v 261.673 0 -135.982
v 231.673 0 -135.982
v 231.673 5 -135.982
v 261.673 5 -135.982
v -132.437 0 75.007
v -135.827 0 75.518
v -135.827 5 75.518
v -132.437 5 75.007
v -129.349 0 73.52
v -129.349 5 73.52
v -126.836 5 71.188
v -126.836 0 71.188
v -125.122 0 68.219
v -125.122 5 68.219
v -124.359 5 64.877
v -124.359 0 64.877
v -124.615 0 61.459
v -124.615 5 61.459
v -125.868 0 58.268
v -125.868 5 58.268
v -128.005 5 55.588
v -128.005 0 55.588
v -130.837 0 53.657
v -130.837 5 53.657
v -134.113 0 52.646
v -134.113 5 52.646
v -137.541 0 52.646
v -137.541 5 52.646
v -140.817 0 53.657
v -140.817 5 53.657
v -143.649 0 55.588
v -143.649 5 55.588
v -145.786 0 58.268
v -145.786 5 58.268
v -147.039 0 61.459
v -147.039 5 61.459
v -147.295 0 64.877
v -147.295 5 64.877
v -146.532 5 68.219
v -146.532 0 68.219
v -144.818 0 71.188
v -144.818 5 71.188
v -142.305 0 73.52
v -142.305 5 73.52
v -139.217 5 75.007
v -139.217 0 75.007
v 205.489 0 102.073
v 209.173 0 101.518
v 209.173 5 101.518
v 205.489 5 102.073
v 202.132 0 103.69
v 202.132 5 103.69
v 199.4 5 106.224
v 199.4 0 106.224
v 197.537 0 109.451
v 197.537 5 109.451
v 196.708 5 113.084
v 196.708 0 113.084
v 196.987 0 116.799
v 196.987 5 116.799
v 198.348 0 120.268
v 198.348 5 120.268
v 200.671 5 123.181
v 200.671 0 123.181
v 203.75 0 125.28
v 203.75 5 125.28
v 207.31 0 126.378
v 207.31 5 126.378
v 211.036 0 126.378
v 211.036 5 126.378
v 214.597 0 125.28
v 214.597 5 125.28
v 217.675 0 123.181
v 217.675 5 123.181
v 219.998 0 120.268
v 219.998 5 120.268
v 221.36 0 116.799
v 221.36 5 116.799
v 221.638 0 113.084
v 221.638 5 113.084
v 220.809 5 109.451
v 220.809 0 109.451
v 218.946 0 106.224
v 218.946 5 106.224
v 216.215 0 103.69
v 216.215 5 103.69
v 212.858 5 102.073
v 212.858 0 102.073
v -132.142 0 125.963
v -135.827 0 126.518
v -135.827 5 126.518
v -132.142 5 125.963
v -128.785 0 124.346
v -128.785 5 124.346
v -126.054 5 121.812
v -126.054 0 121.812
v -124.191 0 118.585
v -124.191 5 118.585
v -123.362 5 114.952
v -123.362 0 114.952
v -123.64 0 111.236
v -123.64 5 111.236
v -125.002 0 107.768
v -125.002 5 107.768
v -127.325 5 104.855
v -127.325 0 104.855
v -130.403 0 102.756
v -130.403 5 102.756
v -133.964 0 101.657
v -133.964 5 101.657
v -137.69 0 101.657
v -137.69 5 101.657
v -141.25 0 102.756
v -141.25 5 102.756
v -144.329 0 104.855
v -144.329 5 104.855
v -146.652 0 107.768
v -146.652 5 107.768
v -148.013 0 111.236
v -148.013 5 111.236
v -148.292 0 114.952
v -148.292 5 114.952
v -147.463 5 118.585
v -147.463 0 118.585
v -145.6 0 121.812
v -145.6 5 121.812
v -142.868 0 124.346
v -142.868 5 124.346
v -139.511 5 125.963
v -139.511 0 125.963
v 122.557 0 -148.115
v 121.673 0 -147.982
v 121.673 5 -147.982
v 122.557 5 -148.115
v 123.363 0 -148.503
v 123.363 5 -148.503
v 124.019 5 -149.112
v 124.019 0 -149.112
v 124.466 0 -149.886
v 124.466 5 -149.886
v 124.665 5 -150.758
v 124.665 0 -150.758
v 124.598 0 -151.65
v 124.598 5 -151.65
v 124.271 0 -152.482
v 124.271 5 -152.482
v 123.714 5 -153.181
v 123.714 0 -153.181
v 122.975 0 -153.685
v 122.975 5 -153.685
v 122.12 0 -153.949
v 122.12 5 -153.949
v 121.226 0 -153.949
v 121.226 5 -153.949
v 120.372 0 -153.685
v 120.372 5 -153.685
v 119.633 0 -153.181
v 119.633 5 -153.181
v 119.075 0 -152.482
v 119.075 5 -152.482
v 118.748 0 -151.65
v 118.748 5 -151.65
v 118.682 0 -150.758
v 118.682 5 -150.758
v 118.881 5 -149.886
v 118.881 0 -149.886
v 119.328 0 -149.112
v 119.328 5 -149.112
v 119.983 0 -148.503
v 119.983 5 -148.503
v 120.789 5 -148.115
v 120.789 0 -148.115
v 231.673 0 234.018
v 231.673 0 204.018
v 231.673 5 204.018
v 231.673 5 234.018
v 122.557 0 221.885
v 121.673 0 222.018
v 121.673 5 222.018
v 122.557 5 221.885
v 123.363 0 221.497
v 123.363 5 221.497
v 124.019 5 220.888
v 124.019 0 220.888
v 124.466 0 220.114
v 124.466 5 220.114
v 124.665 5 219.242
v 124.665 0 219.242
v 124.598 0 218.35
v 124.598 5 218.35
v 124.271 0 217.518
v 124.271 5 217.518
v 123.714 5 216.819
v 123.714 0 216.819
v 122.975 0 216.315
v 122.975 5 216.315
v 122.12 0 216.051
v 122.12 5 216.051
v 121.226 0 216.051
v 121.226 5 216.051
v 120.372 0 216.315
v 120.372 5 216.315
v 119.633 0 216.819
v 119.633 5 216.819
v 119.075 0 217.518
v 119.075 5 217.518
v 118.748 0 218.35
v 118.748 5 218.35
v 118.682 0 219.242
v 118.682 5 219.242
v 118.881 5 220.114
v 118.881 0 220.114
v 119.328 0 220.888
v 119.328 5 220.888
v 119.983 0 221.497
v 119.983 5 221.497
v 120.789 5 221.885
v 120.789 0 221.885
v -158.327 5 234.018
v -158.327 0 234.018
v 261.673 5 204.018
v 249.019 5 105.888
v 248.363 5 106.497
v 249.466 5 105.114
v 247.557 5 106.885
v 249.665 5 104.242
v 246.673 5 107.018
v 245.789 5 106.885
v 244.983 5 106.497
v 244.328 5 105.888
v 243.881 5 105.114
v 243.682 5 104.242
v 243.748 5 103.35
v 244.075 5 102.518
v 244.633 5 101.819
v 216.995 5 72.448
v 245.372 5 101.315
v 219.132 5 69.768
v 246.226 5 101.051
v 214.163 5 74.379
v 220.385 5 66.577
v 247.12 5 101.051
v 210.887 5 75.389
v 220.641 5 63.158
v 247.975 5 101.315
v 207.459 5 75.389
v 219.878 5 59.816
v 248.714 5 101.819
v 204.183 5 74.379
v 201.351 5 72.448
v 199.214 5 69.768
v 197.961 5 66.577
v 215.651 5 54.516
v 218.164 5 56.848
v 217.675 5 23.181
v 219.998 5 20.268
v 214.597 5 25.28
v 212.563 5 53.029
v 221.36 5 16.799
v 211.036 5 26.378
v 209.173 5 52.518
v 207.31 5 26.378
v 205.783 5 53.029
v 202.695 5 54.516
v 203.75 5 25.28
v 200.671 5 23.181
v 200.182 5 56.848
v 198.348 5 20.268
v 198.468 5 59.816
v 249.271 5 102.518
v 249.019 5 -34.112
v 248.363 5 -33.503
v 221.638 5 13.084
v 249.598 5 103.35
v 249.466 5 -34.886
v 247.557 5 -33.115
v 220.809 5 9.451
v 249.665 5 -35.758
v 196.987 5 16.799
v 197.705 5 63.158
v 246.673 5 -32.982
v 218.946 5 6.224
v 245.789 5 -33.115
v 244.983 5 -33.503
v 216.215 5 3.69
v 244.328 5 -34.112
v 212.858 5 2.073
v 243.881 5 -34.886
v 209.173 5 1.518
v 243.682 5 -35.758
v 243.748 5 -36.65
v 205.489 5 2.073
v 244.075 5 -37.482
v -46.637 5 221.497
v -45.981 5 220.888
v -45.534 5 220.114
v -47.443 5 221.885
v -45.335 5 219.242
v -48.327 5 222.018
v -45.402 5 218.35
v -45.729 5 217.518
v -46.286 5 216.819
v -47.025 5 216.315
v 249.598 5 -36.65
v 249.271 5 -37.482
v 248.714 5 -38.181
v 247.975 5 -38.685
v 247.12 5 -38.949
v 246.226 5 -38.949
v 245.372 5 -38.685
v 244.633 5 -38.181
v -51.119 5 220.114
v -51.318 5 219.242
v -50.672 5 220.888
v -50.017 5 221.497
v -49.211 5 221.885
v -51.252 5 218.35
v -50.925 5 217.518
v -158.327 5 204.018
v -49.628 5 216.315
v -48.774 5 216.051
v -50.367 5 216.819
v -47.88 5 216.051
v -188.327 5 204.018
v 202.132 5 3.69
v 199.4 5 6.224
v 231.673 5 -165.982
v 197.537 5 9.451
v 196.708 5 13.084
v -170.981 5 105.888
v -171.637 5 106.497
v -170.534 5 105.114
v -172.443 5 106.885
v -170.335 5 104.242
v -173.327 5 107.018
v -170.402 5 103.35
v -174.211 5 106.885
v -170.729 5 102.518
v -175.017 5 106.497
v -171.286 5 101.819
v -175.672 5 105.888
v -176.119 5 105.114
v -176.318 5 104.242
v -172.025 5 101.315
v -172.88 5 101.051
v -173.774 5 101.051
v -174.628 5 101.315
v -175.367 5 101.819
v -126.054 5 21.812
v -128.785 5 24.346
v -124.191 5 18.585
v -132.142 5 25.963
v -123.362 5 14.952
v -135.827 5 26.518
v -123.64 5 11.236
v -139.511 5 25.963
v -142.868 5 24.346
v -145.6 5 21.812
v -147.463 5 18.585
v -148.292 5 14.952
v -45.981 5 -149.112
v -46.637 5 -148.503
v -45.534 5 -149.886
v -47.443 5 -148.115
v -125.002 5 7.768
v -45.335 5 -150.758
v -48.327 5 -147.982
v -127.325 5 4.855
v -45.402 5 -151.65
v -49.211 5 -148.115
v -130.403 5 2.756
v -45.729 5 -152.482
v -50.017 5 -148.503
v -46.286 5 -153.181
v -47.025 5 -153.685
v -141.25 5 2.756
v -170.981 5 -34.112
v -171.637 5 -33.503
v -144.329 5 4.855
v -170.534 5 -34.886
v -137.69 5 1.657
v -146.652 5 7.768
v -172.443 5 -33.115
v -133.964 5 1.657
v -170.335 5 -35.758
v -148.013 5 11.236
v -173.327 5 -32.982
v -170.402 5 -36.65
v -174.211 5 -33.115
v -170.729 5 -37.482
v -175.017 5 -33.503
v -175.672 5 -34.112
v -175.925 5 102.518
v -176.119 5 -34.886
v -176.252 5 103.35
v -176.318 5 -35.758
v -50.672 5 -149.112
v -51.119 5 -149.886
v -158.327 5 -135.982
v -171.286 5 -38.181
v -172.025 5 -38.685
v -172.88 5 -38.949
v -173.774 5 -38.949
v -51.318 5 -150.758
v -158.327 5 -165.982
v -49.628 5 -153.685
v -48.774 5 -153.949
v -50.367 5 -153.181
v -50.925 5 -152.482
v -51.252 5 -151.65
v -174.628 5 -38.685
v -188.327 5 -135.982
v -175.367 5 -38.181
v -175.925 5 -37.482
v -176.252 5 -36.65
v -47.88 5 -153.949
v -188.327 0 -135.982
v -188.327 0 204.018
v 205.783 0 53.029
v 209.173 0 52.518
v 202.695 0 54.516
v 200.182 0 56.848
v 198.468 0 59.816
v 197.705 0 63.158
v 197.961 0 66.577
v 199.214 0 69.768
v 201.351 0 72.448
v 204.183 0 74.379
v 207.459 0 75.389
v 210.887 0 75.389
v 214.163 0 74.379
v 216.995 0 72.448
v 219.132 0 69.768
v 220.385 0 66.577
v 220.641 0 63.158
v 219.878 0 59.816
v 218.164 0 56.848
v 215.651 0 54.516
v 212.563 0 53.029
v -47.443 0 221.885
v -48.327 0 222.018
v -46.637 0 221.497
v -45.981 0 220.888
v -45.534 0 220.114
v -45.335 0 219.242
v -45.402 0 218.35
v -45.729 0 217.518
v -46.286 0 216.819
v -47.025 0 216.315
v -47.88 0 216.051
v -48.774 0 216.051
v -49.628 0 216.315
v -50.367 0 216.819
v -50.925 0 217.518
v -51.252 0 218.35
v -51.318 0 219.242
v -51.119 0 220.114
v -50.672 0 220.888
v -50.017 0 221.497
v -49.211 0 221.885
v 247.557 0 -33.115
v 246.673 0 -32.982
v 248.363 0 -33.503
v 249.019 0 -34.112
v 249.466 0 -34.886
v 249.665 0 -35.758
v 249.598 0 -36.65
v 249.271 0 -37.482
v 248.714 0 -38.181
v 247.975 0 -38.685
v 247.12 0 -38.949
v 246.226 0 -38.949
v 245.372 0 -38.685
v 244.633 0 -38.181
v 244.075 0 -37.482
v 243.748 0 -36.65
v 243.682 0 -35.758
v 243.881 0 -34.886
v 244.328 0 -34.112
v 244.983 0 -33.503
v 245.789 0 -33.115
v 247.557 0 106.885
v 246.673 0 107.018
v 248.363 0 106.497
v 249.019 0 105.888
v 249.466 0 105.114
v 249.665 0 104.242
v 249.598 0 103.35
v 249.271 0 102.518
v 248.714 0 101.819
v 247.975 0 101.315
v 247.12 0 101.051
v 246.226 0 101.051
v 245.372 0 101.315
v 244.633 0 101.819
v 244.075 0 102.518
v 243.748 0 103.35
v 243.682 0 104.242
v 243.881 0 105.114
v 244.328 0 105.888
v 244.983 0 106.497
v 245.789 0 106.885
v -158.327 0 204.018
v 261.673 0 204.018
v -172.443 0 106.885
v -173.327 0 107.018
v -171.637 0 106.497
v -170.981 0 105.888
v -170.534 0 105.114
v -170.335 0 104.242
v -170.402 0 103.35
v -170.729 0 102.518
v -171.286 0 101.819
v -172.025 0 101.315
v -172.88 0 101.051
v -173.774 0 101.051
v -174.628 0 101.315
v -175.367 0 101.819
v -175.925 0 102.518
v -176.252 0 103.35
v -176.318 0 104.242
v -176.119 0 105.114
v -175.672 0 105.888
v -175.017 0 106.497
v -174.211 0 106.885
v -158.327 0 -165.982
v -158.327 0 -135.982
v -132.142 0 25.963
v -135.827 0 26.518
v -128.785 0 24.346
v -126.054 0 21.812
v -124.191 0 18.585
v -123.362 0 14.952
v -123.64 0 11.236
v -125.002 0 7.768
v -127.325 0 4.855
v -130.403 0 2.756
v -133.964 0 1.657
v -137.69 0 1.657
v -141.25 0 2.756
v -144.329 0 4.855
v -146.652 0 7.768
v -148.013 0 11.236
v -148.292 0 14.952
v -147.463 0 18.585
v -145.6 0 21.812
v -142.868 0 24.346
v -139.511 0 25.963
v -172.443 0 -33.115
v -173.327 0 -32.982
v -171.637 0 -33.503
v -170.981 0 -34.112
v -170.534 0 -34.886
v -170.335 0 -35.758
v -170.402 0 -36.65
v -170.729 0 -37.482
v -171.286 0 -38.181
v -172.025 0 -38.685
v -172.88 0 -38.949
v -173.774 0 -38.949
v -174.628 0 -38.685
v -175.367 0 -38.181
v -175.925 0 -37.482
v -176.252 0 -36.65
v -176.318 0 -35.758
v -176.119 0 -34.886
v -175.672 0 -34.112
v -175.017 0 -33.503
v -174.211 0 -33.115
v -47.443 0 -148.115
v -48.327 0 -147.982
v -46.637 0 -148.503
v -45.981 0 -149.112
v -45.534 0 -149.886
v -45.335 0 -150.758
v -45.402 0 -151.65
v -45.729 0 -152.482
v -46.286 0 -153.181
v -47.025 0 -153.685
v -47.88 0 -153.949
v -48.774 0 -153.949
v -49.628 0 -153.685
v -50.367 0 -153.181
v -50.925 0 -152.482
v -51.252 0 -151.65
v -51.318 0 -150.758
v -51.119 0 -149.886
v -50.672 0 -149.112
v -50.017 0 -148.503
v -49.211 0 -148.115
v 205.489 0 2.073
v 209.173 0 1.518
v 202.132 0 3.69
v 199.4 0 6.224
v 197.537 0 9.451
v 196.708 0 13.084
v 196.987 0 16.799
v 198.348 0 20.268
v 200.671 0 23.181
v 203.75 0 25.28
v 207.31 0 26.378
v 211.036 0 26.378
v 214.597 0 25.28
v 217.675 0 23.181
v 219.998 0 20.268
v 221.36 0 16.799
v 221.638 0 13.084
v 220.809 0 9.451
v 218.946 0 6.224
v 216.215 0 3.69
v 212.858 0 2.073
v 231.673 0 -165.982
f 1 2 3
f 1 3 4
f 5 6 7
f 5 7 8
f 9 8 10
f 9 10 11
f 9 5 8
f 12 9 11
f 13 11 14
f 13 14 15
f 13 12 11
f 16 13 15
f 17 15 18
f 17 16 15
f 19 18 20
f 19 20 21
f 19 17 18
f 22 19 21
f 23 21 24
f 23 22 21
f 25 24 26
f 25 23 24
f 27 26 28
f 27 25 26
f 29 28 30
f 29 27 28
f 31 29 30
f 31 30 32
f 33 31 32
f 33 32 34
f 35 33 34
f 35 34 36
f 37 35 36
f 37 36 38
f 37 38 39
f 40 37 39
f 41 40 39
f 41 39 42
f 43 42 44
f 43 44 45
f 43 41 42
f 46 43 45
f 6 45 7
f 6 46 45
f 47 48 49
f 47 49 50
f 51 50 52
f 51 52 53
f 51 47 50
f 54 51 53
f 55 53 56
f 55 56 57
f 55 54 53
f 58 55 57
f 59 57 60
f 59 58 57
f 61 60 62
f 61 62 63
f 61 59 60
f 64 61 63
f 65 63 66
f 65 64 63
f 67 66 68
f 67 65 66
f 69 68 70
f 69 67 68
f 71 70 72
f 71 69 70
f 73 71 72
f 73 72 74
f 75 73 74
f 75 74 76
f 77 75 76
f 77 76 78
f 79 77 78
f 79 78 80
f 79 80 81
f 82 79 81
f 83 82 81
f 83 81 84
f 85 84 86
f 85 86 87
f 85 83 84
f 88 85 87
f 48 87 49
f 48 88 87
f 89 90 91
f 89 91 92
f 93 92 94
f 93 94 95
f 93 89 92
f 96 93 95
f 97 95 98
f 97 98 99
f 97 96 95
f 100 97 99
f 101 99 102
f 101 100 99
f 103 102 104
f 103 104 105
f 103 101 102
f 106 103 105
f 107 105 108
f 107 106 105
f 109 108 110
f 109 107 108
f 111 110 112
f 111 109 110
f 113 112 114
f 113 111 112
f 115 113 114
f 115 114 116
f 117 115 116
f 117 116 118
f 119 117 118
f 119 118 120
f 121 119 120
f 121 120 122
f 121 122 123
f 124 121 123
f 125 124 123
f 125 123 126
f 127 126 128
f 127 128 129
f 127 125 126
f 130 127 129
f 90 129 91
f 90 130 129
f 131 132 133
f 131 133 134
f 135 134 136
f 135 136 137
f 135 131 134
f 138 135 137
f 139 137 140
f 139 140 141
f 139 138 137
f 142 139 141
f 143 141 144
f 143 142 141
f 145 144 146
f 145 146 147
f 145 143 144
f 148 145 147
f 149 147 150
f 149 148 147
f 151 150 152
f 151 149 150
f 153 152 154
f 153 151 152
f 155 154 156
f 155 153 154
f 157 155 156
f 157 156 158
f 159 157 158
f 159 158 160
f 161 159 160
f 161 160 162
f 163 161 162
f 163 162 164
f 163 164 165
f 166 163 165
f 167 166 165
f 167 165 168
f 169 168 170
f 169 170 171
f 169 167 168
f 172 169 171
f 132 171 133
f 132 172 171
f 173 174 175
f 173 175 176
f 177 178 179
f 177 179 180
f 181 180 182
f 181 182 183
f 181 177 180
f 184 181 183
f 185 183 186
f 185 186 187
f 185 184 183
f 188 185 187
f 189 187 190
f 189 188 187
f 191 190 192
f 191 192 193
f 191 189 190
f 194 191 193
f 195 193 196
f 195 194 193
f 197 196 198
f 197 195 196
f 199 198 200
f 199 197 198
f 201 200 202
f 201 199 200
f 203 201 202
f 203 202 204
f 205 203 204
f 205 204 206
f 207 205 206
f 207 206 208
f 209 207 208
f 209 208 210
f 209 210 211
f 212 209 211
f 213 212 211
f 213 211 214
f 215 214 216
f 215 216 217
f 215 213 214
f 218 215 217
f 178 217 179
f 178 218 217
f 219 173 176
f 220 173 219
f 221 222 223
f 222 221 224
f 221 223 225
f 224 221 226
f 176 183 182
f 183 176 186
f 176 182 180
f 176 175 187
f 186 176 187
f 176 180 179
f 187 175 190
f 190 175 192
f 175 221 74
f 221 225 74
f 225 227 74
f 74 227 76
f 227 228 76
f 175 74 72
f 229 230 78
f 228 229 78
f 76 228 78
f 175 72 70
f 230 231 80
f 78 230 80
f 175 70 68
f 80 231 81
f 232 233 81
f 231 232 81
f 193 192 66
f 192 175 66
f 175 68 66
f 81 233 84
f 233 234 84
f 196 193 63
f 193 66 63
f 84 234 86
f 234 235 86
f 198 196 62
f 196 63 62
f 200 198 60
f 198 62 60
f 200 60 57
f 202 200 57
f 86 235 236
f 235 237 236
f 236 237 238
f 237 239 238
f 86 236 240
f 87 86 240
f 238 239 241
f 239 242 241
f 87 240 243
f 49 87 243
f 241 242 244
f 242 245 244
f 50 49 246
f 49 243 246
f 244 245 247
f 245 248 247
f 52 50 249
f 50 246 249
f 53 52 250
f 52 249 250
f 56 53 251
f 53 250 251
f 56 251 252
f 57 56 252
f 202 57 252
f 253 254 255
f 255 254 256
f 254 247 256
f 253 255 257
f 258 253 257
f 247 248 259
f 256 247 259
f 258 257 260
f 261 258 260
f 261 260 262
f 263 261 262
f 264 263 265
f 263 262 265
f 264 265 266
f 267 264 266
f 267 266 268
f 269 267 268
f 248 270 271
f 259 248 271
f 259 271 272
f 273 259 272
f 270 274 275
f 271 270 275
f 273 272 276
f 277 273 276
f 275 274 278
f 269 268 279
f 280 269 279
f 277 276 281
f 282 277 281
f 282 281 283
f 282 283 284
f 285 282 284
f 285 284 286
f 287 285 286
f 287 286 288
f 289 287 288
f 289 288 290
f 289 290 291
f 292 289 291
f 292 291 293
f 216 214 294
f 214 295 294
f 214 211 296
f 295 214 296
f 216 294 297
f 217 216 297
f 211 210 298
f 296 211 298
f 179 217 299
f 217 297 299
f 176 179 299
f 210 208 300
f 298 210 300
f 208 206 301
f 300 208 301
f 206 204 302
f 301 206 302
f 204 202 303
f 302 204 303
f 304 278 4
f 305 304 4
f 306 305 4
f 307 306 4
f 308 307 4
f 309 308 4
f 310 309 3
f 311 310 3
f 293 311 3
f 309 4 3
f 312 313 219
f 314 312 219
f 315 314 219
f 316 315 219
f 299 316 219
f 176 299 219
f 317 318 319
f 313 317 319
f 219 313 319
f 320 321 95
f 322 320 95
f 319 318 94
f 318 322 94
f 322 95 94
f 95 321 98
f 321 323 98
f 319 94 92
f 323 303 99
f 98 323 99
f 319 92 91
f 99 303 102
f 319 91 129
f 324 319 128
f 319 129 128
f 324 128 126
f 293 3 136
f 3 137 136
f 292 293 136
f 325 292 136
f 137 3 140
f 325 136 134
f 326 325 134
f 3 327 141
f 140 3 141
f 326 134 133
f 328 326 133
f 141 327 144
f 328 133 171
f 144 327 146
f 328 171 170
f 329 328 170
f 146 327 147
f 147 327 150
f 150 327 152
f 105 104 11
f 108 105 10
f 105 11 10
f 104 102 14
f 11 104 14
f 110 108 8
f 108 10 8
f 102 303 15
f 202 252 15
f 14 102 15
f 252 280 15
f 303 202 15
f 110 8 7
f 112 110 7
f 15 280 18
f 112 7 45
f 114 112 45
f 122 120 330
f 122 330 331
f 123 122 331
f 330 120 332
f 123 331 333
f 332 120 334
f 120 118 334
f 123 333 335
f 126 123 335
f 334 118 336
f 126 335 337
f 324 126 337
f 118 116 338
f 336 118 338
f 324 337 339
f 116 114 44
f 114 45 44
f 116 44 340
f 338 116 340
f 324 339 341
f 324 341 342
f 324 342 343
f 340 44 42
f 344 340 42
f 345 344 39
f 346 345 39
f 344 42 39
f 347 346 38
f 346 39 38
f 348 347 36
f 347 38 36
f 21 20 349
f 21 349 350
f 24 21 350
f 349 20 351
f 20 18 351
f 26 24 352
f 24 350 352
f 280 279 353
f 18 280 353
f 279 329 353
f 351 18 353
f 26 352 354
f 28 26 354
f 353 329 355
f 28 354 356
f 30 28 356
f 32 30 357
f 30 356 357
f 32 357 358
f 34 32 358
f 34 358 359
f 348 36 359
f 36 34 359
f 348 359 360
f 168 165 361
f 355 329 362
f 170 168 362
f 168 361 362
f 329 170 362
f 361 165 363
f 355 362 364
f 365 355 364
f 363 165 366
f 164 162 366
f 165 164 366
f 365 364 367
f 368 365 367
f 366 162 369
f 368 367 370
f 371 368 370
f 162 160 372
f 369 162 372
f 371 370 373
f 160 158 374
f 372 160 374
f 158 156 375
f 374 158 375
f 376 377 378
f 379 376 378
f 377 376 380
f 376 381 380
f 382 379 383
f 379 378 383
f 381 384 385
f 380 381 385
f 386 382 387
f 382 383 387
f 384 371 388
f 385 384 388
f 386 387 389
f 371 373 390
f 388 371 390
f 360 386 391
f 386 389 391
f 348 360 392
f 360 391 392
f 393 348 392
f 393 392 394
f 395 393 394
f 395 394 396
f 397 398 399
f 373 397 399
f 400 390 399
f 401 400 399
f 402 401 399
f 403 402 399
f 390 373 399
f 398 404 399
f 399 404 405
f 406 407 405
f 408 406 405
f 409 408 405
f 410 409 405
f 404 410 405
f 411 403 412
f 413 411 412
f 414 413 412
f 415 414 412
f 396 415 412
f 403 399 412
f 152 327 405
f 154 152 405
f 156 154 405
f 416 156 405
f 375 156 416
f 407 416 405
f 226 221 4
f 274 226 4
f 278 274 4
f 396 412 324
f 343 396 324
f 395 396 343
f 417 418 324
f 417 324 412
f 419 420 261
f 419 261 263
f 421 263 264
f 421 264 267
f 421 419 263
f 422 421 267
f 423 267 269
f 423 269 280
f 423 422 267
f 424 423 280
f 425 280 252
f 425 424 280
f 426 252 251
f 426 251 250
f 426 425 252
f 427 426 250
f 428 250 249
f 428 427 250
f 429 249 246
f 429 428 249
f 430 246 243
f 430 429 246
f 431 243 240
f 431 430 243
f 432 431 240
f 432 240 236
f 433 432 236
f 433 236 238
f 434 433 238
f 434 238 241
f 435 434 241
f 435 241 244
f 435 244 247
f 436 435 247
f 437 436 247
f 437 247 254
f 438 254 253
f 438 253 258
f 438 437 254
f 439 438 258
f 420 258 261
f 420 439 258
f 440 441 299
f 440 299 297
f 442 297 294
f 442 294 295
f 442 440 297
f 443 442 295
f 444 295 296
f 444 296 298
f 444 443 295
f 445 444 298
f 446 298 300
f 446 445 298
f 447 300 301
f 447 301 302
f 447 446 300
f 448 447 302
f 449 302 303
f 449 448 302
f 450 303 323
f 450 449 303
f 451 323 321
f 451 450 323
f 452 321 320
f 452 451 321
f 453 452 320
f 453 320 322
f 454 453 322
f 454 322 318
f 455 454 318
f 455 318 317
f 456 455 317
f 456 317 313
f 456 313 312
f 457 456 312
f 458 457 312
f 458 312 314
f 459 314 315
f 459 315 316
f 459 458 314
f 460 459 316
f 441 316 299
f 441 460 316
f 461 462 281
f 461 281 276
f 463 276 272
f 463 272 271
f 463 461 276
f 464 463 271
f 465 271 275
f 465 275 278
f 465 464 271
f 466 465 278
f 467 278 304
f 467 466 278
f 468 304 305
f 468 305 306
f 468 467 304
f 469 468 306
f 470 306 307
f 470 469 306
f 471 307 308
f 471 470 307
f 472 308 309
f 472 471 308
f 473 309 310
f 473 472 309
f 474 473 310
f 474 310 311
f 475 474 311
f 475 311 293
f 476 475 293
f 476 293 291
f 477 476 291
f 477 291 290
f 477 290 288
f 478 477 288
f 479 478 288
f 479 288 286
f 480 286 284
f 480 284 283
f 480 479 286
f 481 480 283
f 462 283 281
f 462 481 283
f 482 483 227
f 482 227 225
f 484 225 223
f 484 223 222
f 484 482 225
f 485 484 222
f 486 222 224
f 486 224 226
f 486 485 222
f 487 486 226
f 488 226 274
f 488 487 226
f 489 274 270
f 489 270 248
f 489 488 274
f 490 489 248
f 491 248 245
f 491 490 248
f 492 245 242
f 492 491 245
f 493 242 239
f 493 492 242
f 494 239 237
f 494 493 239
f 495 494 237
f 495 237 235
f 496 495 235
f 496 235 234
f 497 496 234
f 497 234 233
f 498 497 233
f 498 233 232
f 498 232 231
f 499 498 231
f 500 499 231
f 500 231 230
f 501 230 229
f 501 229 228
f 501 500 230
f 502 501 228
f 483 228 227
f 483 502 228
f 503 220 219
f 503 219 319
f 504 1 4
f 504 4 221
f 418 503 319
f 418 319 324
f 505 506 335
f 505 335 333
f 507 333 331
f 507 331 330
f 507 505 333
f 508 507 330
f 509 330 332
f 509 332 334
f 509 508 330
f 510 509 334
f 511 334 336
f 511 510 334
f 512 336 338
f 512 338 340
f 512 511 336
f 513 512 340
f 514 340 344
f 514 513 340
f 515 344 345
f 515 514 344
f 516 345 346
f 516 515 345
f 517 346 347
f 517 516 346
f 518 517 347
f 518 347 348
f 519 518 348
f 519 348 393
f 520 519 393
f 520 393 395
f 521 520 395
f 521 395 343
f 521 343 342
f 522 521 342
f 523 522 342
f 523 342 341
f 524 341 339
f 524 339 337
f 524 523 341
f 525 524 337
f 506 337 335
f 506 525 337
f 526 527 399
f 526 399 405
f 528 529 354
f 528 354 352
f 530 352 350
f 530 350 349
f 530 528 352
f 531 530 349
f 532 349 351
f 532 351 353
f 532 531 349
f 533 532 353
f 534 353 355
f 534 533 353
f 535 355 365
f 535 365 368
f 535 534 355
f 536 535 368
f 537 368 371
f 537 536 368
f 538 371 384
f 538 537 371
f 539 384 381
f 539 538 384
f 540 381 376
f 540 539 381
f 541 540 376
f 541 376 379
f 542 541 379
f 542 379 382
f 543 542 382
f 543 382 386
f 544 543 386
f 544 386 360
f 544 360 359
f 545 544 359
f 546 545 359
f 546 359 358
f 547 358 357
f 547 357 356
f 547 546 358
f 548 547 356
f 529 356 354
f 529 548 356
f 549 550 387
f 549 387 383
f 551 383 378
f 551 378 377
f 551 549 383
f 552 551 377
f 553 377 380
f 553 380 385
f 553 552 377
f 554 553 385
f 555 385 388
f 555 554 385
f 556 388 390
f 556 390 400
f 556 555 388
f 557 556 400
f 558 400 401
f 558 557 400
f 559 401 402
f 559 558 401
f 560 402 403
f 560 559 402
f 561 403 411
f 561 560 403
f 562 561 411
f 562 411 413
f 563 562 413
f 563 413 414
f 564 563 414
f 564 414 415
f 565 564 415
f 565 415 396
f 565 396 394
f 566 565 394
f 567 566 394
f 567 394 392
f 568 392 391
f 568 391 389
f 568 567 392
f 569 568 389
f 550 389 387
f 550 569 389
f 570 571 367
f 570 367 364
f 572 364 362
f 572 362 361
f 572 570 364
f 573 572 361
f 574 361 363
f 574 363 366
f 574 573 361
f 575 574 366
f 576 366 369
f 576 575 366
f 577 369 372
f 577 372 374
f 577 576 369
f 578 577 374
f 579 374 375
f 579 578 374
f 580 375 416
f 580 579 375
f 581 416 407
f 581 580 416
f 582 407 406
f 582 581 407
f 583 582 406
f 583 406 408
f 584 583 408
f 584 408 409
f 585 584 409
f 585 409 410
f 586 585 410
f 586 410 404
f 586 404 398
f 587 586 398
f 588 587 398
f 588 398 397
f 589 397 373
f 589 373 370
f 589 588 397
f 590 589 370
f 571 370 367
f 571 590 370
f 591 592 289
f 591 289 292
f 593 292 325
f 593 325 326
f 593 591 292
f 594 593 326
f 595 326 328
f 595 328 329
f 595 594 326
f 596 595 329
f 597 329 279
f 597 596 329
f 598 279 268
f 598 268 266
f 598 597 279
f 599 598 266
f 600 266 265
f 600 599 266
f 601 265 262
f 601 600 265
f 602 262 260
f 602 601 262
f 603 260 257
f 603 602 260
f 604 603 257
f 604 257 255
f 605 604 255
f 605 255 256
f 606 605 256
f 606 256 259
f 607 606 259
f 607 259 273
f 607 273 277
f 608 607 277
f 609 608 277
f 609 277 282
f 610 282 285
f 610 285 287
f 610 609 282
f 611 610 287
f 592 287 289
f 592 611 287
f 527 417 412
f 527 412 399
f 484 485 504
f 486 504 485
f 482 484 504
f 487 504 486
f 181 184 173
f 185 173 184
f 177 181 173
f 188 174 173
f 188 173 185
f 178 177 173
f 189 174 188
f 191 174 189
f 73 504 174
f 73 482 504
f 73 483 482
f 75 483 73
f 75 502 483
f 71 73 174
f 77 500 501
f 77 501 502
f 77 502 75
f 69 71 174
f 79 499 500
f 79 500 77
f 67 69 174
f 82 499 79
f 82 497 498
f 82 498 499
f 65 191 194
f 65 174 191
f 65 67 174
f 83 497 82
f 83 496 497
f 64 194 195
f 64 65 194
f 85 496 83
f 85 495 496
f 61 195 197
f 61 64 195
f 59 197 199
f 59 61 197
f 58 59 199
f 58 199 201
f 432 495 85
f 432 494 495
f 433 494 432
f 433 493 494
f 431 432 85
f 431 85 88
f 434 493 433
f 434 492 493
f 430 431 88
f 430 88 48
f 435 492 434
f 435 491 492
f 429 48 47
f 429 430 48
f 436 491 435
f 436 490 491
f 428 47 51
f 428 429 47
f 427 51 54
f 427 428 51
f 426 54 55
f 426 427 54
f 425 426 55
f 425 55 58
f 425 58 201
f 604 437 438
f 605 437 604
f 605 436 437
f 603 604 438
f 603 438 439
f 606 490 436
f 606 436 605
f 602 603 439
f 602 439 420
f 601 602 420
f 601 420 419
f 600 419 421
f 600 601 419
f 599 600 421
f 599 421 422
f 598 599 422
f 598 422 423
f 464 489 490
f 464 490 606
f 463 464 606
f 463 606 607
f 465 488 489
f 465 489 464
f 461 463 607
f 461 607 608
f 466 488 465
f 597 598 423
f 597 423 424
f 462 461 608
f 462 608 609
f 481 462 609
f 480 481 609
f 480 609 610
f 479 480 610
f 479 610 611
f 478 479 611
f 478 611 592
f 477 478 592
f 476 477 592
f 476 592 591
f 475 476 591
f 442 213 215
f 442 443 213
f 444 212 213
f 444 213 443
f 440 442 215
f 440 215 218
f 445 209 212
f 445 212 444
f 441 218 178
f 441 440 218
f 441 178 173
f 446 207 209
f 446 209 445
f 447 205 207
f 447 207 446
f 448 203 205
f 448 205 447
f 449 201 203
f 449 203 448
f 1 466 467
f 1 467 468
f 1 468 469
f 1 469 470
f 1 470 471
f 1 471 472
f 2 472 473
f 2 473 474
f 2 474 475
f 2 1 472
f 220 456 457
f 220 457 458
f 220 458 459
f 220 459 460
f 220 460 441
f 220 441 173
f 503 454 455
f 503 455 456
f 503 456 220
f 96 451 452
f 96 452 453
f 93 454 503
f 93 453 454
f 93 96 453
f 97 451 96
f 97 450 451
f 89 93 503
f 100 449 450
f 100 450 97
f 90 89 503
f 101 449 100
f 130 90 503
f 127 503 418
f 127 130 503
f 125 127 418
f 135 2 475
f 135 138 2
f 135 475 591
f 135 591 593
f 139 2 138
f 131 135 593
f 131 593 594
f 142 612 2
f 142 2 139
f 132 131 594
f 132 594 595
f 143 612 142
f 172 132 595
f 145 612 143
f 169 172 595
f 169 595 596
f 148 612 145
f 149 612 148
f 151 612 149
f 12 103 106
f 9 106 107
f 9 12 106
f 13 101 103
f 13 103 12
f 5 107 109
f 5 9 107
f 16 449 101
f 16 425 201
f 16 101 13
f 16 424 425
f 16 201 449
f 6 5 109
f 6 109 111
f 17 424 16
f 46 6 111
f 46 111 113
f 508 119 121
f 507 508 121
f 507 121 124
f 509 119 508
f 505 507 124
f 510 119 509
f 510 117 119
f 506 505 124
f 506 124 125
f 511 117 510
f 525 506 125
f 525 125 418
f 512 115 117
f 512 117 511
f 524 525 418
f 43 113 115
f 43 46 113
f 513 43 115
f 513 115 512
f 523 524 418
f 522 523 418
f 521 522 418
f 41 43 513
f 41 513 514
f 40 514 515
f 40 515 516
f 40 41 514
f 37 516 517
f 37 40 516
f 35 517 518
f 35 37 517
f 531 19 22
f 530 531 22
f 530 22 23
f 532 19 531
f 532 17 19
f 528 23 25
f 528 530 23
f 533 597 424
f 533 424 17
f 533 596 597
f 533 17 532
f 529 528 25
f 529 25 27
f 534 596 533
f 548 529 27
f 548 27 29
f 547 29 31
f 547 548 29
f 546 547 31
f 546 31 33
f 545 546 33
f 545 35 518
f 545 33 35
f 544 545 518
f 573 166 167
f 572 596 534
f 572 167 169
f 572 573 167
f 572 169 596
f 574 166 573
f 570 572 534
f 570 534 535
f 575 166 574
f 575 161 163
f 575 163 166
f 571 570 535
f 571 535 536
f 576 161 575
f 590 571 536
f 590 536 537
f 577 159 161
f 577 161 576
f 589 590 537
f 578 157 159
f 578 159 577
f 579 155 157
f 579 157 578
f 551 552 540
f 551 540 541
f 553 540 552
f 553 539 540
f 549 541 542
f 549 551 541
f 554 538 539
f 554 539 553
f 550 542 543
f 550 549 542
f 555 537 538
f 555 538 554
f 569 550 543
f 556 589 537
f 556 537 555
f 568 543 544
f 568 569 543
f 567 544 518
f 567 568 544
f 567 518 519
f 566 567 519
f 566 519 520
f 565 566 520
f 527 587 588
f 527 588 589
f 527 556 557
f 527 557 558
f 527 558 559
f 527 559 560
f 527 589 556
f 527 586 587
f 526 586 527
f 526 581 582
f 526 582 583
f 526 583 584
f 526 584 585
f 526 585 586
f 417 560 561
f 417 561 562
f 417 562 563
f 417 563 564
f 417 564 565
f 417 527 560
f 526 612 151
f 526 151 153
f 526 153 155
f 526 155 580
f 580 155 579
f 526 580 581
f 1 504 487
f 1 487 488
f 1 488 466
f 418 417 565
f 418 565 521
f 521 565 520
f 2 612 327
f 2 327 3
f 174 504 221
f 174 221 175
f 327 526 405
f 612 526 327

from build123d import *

# Parameters (mm, degrees)
CROQUIS1_R              = 3
CROQUIS1_R_2            = 11.5
CROQUIS1_R_3            = 12.5
SALIENTE_EXTRUIR1_DEPTH = 5


with BuildPart() as part:
    # Croquis1 → Saliente-Extruir1 (new body)
    with BuildSketch(Plane(origin=(0, 0, 0), x_dir=(1, 0, 0), z_dir=(0, 1, 0))):
        Polygon((-158.326848249, 165.982121671), (231.673151751, 165.982121671), (231.673151751, 135.982121671), (261.673151751, 135.982121671), (261.673151751, -204.017878329), (231.673151751, -204.017878329), (231.673151751, -234.017878329), (-158.326848249, -234.017878329), (-158.326848249, -204.017878329), (-188.326848249, -204.017878329), (-188.326848249, 135.982121671), (-158.326848249, 135.982121671), align=None)
        with Locations(Location((-173.326848249, 35.982121671, 0), (0, 0, 270))):
            Circle(CROQUIS1_R, mode=Mode.SUBTRACT)
        with Locations(Location((-173.326848249, -104.017878329, 0), (0, 0, 270))):
            Circle(CROQUIS1_R, mode=Mode.SUBTRACT)
        with Locations(Location((-48.326848249, 150.982121671, 0), (0, 0, 270))):
            Circle(CROQUIS1_R, mode=Mode.SUBTRACT)
        with Locations(Location((121.673151751, 150.982121671, 0), (0, 0, 270))):
            Circle(CROQUIS1_R, mode=Mode.SUBTRACT)
        with Locations(Location((246.673151751, 35.982121671, 0), (0, 0, 270))):
            Circle(CROQUIS1_R, mode=Mode.SUBTRACT)
        with Locations(Location((246.673151751, -104.017878329, 0), (0, 0, 270))):
            Circle(CROQUIS1_R, mode=Mode.SUBTRACT)
        with Locations(Location((-48.326848249, -219.017878329, 0), (0, 0, 270))):
            Circle(CROQUIS1_R, mode=Mode.SUBTRACT)
        with Locations(Location((121.673151751, -219.017878329, 0), (0, 0, 270))):
            Circle(CROQUIS1_R, mode=Mode.SUBTRACT)
        with Locations(Location((-135.826848249, -64.017878329, 0), (0, 0, 270))):
            Circle(CROQUIS1_R_2, mode=Mode.SUBTRACT)
        with Locations(Location((-135.826848249, -114.017878329, 0), (0, 0, 270))):
            Circle(CROQUIS1_R_3, mode=Mode.SUBTRACT)
        with Locations(Location((-135.826848249, -14.017878329, 0), (0, 0, 270))):
            Circle(CROQUIS1_R_3, mode=Mode.SUBTRACT)
        with Locations(Location((209.173151751, -114.017878329, 0), (0, 0, 90))):
            Circle(CROQUIS1_R_3, mode=Mode.SUBTRACT)
        with Locations(Location((209.173151751, -64.017878329, 0), (0, 0, 90))):
            Circle(CROQUIS1_R_2, mode=Mode.SUBTRACT)
        with Locations(Location((209.173151751, -14.017878329, 0), (0, 0, 90))):
            Circle(CROQUIS1_R_3, mode=Mode.SUBTRACT)
    extrude(amount=SALIENTE_EXTRUIR1_DEPTH)


solid = part.part
